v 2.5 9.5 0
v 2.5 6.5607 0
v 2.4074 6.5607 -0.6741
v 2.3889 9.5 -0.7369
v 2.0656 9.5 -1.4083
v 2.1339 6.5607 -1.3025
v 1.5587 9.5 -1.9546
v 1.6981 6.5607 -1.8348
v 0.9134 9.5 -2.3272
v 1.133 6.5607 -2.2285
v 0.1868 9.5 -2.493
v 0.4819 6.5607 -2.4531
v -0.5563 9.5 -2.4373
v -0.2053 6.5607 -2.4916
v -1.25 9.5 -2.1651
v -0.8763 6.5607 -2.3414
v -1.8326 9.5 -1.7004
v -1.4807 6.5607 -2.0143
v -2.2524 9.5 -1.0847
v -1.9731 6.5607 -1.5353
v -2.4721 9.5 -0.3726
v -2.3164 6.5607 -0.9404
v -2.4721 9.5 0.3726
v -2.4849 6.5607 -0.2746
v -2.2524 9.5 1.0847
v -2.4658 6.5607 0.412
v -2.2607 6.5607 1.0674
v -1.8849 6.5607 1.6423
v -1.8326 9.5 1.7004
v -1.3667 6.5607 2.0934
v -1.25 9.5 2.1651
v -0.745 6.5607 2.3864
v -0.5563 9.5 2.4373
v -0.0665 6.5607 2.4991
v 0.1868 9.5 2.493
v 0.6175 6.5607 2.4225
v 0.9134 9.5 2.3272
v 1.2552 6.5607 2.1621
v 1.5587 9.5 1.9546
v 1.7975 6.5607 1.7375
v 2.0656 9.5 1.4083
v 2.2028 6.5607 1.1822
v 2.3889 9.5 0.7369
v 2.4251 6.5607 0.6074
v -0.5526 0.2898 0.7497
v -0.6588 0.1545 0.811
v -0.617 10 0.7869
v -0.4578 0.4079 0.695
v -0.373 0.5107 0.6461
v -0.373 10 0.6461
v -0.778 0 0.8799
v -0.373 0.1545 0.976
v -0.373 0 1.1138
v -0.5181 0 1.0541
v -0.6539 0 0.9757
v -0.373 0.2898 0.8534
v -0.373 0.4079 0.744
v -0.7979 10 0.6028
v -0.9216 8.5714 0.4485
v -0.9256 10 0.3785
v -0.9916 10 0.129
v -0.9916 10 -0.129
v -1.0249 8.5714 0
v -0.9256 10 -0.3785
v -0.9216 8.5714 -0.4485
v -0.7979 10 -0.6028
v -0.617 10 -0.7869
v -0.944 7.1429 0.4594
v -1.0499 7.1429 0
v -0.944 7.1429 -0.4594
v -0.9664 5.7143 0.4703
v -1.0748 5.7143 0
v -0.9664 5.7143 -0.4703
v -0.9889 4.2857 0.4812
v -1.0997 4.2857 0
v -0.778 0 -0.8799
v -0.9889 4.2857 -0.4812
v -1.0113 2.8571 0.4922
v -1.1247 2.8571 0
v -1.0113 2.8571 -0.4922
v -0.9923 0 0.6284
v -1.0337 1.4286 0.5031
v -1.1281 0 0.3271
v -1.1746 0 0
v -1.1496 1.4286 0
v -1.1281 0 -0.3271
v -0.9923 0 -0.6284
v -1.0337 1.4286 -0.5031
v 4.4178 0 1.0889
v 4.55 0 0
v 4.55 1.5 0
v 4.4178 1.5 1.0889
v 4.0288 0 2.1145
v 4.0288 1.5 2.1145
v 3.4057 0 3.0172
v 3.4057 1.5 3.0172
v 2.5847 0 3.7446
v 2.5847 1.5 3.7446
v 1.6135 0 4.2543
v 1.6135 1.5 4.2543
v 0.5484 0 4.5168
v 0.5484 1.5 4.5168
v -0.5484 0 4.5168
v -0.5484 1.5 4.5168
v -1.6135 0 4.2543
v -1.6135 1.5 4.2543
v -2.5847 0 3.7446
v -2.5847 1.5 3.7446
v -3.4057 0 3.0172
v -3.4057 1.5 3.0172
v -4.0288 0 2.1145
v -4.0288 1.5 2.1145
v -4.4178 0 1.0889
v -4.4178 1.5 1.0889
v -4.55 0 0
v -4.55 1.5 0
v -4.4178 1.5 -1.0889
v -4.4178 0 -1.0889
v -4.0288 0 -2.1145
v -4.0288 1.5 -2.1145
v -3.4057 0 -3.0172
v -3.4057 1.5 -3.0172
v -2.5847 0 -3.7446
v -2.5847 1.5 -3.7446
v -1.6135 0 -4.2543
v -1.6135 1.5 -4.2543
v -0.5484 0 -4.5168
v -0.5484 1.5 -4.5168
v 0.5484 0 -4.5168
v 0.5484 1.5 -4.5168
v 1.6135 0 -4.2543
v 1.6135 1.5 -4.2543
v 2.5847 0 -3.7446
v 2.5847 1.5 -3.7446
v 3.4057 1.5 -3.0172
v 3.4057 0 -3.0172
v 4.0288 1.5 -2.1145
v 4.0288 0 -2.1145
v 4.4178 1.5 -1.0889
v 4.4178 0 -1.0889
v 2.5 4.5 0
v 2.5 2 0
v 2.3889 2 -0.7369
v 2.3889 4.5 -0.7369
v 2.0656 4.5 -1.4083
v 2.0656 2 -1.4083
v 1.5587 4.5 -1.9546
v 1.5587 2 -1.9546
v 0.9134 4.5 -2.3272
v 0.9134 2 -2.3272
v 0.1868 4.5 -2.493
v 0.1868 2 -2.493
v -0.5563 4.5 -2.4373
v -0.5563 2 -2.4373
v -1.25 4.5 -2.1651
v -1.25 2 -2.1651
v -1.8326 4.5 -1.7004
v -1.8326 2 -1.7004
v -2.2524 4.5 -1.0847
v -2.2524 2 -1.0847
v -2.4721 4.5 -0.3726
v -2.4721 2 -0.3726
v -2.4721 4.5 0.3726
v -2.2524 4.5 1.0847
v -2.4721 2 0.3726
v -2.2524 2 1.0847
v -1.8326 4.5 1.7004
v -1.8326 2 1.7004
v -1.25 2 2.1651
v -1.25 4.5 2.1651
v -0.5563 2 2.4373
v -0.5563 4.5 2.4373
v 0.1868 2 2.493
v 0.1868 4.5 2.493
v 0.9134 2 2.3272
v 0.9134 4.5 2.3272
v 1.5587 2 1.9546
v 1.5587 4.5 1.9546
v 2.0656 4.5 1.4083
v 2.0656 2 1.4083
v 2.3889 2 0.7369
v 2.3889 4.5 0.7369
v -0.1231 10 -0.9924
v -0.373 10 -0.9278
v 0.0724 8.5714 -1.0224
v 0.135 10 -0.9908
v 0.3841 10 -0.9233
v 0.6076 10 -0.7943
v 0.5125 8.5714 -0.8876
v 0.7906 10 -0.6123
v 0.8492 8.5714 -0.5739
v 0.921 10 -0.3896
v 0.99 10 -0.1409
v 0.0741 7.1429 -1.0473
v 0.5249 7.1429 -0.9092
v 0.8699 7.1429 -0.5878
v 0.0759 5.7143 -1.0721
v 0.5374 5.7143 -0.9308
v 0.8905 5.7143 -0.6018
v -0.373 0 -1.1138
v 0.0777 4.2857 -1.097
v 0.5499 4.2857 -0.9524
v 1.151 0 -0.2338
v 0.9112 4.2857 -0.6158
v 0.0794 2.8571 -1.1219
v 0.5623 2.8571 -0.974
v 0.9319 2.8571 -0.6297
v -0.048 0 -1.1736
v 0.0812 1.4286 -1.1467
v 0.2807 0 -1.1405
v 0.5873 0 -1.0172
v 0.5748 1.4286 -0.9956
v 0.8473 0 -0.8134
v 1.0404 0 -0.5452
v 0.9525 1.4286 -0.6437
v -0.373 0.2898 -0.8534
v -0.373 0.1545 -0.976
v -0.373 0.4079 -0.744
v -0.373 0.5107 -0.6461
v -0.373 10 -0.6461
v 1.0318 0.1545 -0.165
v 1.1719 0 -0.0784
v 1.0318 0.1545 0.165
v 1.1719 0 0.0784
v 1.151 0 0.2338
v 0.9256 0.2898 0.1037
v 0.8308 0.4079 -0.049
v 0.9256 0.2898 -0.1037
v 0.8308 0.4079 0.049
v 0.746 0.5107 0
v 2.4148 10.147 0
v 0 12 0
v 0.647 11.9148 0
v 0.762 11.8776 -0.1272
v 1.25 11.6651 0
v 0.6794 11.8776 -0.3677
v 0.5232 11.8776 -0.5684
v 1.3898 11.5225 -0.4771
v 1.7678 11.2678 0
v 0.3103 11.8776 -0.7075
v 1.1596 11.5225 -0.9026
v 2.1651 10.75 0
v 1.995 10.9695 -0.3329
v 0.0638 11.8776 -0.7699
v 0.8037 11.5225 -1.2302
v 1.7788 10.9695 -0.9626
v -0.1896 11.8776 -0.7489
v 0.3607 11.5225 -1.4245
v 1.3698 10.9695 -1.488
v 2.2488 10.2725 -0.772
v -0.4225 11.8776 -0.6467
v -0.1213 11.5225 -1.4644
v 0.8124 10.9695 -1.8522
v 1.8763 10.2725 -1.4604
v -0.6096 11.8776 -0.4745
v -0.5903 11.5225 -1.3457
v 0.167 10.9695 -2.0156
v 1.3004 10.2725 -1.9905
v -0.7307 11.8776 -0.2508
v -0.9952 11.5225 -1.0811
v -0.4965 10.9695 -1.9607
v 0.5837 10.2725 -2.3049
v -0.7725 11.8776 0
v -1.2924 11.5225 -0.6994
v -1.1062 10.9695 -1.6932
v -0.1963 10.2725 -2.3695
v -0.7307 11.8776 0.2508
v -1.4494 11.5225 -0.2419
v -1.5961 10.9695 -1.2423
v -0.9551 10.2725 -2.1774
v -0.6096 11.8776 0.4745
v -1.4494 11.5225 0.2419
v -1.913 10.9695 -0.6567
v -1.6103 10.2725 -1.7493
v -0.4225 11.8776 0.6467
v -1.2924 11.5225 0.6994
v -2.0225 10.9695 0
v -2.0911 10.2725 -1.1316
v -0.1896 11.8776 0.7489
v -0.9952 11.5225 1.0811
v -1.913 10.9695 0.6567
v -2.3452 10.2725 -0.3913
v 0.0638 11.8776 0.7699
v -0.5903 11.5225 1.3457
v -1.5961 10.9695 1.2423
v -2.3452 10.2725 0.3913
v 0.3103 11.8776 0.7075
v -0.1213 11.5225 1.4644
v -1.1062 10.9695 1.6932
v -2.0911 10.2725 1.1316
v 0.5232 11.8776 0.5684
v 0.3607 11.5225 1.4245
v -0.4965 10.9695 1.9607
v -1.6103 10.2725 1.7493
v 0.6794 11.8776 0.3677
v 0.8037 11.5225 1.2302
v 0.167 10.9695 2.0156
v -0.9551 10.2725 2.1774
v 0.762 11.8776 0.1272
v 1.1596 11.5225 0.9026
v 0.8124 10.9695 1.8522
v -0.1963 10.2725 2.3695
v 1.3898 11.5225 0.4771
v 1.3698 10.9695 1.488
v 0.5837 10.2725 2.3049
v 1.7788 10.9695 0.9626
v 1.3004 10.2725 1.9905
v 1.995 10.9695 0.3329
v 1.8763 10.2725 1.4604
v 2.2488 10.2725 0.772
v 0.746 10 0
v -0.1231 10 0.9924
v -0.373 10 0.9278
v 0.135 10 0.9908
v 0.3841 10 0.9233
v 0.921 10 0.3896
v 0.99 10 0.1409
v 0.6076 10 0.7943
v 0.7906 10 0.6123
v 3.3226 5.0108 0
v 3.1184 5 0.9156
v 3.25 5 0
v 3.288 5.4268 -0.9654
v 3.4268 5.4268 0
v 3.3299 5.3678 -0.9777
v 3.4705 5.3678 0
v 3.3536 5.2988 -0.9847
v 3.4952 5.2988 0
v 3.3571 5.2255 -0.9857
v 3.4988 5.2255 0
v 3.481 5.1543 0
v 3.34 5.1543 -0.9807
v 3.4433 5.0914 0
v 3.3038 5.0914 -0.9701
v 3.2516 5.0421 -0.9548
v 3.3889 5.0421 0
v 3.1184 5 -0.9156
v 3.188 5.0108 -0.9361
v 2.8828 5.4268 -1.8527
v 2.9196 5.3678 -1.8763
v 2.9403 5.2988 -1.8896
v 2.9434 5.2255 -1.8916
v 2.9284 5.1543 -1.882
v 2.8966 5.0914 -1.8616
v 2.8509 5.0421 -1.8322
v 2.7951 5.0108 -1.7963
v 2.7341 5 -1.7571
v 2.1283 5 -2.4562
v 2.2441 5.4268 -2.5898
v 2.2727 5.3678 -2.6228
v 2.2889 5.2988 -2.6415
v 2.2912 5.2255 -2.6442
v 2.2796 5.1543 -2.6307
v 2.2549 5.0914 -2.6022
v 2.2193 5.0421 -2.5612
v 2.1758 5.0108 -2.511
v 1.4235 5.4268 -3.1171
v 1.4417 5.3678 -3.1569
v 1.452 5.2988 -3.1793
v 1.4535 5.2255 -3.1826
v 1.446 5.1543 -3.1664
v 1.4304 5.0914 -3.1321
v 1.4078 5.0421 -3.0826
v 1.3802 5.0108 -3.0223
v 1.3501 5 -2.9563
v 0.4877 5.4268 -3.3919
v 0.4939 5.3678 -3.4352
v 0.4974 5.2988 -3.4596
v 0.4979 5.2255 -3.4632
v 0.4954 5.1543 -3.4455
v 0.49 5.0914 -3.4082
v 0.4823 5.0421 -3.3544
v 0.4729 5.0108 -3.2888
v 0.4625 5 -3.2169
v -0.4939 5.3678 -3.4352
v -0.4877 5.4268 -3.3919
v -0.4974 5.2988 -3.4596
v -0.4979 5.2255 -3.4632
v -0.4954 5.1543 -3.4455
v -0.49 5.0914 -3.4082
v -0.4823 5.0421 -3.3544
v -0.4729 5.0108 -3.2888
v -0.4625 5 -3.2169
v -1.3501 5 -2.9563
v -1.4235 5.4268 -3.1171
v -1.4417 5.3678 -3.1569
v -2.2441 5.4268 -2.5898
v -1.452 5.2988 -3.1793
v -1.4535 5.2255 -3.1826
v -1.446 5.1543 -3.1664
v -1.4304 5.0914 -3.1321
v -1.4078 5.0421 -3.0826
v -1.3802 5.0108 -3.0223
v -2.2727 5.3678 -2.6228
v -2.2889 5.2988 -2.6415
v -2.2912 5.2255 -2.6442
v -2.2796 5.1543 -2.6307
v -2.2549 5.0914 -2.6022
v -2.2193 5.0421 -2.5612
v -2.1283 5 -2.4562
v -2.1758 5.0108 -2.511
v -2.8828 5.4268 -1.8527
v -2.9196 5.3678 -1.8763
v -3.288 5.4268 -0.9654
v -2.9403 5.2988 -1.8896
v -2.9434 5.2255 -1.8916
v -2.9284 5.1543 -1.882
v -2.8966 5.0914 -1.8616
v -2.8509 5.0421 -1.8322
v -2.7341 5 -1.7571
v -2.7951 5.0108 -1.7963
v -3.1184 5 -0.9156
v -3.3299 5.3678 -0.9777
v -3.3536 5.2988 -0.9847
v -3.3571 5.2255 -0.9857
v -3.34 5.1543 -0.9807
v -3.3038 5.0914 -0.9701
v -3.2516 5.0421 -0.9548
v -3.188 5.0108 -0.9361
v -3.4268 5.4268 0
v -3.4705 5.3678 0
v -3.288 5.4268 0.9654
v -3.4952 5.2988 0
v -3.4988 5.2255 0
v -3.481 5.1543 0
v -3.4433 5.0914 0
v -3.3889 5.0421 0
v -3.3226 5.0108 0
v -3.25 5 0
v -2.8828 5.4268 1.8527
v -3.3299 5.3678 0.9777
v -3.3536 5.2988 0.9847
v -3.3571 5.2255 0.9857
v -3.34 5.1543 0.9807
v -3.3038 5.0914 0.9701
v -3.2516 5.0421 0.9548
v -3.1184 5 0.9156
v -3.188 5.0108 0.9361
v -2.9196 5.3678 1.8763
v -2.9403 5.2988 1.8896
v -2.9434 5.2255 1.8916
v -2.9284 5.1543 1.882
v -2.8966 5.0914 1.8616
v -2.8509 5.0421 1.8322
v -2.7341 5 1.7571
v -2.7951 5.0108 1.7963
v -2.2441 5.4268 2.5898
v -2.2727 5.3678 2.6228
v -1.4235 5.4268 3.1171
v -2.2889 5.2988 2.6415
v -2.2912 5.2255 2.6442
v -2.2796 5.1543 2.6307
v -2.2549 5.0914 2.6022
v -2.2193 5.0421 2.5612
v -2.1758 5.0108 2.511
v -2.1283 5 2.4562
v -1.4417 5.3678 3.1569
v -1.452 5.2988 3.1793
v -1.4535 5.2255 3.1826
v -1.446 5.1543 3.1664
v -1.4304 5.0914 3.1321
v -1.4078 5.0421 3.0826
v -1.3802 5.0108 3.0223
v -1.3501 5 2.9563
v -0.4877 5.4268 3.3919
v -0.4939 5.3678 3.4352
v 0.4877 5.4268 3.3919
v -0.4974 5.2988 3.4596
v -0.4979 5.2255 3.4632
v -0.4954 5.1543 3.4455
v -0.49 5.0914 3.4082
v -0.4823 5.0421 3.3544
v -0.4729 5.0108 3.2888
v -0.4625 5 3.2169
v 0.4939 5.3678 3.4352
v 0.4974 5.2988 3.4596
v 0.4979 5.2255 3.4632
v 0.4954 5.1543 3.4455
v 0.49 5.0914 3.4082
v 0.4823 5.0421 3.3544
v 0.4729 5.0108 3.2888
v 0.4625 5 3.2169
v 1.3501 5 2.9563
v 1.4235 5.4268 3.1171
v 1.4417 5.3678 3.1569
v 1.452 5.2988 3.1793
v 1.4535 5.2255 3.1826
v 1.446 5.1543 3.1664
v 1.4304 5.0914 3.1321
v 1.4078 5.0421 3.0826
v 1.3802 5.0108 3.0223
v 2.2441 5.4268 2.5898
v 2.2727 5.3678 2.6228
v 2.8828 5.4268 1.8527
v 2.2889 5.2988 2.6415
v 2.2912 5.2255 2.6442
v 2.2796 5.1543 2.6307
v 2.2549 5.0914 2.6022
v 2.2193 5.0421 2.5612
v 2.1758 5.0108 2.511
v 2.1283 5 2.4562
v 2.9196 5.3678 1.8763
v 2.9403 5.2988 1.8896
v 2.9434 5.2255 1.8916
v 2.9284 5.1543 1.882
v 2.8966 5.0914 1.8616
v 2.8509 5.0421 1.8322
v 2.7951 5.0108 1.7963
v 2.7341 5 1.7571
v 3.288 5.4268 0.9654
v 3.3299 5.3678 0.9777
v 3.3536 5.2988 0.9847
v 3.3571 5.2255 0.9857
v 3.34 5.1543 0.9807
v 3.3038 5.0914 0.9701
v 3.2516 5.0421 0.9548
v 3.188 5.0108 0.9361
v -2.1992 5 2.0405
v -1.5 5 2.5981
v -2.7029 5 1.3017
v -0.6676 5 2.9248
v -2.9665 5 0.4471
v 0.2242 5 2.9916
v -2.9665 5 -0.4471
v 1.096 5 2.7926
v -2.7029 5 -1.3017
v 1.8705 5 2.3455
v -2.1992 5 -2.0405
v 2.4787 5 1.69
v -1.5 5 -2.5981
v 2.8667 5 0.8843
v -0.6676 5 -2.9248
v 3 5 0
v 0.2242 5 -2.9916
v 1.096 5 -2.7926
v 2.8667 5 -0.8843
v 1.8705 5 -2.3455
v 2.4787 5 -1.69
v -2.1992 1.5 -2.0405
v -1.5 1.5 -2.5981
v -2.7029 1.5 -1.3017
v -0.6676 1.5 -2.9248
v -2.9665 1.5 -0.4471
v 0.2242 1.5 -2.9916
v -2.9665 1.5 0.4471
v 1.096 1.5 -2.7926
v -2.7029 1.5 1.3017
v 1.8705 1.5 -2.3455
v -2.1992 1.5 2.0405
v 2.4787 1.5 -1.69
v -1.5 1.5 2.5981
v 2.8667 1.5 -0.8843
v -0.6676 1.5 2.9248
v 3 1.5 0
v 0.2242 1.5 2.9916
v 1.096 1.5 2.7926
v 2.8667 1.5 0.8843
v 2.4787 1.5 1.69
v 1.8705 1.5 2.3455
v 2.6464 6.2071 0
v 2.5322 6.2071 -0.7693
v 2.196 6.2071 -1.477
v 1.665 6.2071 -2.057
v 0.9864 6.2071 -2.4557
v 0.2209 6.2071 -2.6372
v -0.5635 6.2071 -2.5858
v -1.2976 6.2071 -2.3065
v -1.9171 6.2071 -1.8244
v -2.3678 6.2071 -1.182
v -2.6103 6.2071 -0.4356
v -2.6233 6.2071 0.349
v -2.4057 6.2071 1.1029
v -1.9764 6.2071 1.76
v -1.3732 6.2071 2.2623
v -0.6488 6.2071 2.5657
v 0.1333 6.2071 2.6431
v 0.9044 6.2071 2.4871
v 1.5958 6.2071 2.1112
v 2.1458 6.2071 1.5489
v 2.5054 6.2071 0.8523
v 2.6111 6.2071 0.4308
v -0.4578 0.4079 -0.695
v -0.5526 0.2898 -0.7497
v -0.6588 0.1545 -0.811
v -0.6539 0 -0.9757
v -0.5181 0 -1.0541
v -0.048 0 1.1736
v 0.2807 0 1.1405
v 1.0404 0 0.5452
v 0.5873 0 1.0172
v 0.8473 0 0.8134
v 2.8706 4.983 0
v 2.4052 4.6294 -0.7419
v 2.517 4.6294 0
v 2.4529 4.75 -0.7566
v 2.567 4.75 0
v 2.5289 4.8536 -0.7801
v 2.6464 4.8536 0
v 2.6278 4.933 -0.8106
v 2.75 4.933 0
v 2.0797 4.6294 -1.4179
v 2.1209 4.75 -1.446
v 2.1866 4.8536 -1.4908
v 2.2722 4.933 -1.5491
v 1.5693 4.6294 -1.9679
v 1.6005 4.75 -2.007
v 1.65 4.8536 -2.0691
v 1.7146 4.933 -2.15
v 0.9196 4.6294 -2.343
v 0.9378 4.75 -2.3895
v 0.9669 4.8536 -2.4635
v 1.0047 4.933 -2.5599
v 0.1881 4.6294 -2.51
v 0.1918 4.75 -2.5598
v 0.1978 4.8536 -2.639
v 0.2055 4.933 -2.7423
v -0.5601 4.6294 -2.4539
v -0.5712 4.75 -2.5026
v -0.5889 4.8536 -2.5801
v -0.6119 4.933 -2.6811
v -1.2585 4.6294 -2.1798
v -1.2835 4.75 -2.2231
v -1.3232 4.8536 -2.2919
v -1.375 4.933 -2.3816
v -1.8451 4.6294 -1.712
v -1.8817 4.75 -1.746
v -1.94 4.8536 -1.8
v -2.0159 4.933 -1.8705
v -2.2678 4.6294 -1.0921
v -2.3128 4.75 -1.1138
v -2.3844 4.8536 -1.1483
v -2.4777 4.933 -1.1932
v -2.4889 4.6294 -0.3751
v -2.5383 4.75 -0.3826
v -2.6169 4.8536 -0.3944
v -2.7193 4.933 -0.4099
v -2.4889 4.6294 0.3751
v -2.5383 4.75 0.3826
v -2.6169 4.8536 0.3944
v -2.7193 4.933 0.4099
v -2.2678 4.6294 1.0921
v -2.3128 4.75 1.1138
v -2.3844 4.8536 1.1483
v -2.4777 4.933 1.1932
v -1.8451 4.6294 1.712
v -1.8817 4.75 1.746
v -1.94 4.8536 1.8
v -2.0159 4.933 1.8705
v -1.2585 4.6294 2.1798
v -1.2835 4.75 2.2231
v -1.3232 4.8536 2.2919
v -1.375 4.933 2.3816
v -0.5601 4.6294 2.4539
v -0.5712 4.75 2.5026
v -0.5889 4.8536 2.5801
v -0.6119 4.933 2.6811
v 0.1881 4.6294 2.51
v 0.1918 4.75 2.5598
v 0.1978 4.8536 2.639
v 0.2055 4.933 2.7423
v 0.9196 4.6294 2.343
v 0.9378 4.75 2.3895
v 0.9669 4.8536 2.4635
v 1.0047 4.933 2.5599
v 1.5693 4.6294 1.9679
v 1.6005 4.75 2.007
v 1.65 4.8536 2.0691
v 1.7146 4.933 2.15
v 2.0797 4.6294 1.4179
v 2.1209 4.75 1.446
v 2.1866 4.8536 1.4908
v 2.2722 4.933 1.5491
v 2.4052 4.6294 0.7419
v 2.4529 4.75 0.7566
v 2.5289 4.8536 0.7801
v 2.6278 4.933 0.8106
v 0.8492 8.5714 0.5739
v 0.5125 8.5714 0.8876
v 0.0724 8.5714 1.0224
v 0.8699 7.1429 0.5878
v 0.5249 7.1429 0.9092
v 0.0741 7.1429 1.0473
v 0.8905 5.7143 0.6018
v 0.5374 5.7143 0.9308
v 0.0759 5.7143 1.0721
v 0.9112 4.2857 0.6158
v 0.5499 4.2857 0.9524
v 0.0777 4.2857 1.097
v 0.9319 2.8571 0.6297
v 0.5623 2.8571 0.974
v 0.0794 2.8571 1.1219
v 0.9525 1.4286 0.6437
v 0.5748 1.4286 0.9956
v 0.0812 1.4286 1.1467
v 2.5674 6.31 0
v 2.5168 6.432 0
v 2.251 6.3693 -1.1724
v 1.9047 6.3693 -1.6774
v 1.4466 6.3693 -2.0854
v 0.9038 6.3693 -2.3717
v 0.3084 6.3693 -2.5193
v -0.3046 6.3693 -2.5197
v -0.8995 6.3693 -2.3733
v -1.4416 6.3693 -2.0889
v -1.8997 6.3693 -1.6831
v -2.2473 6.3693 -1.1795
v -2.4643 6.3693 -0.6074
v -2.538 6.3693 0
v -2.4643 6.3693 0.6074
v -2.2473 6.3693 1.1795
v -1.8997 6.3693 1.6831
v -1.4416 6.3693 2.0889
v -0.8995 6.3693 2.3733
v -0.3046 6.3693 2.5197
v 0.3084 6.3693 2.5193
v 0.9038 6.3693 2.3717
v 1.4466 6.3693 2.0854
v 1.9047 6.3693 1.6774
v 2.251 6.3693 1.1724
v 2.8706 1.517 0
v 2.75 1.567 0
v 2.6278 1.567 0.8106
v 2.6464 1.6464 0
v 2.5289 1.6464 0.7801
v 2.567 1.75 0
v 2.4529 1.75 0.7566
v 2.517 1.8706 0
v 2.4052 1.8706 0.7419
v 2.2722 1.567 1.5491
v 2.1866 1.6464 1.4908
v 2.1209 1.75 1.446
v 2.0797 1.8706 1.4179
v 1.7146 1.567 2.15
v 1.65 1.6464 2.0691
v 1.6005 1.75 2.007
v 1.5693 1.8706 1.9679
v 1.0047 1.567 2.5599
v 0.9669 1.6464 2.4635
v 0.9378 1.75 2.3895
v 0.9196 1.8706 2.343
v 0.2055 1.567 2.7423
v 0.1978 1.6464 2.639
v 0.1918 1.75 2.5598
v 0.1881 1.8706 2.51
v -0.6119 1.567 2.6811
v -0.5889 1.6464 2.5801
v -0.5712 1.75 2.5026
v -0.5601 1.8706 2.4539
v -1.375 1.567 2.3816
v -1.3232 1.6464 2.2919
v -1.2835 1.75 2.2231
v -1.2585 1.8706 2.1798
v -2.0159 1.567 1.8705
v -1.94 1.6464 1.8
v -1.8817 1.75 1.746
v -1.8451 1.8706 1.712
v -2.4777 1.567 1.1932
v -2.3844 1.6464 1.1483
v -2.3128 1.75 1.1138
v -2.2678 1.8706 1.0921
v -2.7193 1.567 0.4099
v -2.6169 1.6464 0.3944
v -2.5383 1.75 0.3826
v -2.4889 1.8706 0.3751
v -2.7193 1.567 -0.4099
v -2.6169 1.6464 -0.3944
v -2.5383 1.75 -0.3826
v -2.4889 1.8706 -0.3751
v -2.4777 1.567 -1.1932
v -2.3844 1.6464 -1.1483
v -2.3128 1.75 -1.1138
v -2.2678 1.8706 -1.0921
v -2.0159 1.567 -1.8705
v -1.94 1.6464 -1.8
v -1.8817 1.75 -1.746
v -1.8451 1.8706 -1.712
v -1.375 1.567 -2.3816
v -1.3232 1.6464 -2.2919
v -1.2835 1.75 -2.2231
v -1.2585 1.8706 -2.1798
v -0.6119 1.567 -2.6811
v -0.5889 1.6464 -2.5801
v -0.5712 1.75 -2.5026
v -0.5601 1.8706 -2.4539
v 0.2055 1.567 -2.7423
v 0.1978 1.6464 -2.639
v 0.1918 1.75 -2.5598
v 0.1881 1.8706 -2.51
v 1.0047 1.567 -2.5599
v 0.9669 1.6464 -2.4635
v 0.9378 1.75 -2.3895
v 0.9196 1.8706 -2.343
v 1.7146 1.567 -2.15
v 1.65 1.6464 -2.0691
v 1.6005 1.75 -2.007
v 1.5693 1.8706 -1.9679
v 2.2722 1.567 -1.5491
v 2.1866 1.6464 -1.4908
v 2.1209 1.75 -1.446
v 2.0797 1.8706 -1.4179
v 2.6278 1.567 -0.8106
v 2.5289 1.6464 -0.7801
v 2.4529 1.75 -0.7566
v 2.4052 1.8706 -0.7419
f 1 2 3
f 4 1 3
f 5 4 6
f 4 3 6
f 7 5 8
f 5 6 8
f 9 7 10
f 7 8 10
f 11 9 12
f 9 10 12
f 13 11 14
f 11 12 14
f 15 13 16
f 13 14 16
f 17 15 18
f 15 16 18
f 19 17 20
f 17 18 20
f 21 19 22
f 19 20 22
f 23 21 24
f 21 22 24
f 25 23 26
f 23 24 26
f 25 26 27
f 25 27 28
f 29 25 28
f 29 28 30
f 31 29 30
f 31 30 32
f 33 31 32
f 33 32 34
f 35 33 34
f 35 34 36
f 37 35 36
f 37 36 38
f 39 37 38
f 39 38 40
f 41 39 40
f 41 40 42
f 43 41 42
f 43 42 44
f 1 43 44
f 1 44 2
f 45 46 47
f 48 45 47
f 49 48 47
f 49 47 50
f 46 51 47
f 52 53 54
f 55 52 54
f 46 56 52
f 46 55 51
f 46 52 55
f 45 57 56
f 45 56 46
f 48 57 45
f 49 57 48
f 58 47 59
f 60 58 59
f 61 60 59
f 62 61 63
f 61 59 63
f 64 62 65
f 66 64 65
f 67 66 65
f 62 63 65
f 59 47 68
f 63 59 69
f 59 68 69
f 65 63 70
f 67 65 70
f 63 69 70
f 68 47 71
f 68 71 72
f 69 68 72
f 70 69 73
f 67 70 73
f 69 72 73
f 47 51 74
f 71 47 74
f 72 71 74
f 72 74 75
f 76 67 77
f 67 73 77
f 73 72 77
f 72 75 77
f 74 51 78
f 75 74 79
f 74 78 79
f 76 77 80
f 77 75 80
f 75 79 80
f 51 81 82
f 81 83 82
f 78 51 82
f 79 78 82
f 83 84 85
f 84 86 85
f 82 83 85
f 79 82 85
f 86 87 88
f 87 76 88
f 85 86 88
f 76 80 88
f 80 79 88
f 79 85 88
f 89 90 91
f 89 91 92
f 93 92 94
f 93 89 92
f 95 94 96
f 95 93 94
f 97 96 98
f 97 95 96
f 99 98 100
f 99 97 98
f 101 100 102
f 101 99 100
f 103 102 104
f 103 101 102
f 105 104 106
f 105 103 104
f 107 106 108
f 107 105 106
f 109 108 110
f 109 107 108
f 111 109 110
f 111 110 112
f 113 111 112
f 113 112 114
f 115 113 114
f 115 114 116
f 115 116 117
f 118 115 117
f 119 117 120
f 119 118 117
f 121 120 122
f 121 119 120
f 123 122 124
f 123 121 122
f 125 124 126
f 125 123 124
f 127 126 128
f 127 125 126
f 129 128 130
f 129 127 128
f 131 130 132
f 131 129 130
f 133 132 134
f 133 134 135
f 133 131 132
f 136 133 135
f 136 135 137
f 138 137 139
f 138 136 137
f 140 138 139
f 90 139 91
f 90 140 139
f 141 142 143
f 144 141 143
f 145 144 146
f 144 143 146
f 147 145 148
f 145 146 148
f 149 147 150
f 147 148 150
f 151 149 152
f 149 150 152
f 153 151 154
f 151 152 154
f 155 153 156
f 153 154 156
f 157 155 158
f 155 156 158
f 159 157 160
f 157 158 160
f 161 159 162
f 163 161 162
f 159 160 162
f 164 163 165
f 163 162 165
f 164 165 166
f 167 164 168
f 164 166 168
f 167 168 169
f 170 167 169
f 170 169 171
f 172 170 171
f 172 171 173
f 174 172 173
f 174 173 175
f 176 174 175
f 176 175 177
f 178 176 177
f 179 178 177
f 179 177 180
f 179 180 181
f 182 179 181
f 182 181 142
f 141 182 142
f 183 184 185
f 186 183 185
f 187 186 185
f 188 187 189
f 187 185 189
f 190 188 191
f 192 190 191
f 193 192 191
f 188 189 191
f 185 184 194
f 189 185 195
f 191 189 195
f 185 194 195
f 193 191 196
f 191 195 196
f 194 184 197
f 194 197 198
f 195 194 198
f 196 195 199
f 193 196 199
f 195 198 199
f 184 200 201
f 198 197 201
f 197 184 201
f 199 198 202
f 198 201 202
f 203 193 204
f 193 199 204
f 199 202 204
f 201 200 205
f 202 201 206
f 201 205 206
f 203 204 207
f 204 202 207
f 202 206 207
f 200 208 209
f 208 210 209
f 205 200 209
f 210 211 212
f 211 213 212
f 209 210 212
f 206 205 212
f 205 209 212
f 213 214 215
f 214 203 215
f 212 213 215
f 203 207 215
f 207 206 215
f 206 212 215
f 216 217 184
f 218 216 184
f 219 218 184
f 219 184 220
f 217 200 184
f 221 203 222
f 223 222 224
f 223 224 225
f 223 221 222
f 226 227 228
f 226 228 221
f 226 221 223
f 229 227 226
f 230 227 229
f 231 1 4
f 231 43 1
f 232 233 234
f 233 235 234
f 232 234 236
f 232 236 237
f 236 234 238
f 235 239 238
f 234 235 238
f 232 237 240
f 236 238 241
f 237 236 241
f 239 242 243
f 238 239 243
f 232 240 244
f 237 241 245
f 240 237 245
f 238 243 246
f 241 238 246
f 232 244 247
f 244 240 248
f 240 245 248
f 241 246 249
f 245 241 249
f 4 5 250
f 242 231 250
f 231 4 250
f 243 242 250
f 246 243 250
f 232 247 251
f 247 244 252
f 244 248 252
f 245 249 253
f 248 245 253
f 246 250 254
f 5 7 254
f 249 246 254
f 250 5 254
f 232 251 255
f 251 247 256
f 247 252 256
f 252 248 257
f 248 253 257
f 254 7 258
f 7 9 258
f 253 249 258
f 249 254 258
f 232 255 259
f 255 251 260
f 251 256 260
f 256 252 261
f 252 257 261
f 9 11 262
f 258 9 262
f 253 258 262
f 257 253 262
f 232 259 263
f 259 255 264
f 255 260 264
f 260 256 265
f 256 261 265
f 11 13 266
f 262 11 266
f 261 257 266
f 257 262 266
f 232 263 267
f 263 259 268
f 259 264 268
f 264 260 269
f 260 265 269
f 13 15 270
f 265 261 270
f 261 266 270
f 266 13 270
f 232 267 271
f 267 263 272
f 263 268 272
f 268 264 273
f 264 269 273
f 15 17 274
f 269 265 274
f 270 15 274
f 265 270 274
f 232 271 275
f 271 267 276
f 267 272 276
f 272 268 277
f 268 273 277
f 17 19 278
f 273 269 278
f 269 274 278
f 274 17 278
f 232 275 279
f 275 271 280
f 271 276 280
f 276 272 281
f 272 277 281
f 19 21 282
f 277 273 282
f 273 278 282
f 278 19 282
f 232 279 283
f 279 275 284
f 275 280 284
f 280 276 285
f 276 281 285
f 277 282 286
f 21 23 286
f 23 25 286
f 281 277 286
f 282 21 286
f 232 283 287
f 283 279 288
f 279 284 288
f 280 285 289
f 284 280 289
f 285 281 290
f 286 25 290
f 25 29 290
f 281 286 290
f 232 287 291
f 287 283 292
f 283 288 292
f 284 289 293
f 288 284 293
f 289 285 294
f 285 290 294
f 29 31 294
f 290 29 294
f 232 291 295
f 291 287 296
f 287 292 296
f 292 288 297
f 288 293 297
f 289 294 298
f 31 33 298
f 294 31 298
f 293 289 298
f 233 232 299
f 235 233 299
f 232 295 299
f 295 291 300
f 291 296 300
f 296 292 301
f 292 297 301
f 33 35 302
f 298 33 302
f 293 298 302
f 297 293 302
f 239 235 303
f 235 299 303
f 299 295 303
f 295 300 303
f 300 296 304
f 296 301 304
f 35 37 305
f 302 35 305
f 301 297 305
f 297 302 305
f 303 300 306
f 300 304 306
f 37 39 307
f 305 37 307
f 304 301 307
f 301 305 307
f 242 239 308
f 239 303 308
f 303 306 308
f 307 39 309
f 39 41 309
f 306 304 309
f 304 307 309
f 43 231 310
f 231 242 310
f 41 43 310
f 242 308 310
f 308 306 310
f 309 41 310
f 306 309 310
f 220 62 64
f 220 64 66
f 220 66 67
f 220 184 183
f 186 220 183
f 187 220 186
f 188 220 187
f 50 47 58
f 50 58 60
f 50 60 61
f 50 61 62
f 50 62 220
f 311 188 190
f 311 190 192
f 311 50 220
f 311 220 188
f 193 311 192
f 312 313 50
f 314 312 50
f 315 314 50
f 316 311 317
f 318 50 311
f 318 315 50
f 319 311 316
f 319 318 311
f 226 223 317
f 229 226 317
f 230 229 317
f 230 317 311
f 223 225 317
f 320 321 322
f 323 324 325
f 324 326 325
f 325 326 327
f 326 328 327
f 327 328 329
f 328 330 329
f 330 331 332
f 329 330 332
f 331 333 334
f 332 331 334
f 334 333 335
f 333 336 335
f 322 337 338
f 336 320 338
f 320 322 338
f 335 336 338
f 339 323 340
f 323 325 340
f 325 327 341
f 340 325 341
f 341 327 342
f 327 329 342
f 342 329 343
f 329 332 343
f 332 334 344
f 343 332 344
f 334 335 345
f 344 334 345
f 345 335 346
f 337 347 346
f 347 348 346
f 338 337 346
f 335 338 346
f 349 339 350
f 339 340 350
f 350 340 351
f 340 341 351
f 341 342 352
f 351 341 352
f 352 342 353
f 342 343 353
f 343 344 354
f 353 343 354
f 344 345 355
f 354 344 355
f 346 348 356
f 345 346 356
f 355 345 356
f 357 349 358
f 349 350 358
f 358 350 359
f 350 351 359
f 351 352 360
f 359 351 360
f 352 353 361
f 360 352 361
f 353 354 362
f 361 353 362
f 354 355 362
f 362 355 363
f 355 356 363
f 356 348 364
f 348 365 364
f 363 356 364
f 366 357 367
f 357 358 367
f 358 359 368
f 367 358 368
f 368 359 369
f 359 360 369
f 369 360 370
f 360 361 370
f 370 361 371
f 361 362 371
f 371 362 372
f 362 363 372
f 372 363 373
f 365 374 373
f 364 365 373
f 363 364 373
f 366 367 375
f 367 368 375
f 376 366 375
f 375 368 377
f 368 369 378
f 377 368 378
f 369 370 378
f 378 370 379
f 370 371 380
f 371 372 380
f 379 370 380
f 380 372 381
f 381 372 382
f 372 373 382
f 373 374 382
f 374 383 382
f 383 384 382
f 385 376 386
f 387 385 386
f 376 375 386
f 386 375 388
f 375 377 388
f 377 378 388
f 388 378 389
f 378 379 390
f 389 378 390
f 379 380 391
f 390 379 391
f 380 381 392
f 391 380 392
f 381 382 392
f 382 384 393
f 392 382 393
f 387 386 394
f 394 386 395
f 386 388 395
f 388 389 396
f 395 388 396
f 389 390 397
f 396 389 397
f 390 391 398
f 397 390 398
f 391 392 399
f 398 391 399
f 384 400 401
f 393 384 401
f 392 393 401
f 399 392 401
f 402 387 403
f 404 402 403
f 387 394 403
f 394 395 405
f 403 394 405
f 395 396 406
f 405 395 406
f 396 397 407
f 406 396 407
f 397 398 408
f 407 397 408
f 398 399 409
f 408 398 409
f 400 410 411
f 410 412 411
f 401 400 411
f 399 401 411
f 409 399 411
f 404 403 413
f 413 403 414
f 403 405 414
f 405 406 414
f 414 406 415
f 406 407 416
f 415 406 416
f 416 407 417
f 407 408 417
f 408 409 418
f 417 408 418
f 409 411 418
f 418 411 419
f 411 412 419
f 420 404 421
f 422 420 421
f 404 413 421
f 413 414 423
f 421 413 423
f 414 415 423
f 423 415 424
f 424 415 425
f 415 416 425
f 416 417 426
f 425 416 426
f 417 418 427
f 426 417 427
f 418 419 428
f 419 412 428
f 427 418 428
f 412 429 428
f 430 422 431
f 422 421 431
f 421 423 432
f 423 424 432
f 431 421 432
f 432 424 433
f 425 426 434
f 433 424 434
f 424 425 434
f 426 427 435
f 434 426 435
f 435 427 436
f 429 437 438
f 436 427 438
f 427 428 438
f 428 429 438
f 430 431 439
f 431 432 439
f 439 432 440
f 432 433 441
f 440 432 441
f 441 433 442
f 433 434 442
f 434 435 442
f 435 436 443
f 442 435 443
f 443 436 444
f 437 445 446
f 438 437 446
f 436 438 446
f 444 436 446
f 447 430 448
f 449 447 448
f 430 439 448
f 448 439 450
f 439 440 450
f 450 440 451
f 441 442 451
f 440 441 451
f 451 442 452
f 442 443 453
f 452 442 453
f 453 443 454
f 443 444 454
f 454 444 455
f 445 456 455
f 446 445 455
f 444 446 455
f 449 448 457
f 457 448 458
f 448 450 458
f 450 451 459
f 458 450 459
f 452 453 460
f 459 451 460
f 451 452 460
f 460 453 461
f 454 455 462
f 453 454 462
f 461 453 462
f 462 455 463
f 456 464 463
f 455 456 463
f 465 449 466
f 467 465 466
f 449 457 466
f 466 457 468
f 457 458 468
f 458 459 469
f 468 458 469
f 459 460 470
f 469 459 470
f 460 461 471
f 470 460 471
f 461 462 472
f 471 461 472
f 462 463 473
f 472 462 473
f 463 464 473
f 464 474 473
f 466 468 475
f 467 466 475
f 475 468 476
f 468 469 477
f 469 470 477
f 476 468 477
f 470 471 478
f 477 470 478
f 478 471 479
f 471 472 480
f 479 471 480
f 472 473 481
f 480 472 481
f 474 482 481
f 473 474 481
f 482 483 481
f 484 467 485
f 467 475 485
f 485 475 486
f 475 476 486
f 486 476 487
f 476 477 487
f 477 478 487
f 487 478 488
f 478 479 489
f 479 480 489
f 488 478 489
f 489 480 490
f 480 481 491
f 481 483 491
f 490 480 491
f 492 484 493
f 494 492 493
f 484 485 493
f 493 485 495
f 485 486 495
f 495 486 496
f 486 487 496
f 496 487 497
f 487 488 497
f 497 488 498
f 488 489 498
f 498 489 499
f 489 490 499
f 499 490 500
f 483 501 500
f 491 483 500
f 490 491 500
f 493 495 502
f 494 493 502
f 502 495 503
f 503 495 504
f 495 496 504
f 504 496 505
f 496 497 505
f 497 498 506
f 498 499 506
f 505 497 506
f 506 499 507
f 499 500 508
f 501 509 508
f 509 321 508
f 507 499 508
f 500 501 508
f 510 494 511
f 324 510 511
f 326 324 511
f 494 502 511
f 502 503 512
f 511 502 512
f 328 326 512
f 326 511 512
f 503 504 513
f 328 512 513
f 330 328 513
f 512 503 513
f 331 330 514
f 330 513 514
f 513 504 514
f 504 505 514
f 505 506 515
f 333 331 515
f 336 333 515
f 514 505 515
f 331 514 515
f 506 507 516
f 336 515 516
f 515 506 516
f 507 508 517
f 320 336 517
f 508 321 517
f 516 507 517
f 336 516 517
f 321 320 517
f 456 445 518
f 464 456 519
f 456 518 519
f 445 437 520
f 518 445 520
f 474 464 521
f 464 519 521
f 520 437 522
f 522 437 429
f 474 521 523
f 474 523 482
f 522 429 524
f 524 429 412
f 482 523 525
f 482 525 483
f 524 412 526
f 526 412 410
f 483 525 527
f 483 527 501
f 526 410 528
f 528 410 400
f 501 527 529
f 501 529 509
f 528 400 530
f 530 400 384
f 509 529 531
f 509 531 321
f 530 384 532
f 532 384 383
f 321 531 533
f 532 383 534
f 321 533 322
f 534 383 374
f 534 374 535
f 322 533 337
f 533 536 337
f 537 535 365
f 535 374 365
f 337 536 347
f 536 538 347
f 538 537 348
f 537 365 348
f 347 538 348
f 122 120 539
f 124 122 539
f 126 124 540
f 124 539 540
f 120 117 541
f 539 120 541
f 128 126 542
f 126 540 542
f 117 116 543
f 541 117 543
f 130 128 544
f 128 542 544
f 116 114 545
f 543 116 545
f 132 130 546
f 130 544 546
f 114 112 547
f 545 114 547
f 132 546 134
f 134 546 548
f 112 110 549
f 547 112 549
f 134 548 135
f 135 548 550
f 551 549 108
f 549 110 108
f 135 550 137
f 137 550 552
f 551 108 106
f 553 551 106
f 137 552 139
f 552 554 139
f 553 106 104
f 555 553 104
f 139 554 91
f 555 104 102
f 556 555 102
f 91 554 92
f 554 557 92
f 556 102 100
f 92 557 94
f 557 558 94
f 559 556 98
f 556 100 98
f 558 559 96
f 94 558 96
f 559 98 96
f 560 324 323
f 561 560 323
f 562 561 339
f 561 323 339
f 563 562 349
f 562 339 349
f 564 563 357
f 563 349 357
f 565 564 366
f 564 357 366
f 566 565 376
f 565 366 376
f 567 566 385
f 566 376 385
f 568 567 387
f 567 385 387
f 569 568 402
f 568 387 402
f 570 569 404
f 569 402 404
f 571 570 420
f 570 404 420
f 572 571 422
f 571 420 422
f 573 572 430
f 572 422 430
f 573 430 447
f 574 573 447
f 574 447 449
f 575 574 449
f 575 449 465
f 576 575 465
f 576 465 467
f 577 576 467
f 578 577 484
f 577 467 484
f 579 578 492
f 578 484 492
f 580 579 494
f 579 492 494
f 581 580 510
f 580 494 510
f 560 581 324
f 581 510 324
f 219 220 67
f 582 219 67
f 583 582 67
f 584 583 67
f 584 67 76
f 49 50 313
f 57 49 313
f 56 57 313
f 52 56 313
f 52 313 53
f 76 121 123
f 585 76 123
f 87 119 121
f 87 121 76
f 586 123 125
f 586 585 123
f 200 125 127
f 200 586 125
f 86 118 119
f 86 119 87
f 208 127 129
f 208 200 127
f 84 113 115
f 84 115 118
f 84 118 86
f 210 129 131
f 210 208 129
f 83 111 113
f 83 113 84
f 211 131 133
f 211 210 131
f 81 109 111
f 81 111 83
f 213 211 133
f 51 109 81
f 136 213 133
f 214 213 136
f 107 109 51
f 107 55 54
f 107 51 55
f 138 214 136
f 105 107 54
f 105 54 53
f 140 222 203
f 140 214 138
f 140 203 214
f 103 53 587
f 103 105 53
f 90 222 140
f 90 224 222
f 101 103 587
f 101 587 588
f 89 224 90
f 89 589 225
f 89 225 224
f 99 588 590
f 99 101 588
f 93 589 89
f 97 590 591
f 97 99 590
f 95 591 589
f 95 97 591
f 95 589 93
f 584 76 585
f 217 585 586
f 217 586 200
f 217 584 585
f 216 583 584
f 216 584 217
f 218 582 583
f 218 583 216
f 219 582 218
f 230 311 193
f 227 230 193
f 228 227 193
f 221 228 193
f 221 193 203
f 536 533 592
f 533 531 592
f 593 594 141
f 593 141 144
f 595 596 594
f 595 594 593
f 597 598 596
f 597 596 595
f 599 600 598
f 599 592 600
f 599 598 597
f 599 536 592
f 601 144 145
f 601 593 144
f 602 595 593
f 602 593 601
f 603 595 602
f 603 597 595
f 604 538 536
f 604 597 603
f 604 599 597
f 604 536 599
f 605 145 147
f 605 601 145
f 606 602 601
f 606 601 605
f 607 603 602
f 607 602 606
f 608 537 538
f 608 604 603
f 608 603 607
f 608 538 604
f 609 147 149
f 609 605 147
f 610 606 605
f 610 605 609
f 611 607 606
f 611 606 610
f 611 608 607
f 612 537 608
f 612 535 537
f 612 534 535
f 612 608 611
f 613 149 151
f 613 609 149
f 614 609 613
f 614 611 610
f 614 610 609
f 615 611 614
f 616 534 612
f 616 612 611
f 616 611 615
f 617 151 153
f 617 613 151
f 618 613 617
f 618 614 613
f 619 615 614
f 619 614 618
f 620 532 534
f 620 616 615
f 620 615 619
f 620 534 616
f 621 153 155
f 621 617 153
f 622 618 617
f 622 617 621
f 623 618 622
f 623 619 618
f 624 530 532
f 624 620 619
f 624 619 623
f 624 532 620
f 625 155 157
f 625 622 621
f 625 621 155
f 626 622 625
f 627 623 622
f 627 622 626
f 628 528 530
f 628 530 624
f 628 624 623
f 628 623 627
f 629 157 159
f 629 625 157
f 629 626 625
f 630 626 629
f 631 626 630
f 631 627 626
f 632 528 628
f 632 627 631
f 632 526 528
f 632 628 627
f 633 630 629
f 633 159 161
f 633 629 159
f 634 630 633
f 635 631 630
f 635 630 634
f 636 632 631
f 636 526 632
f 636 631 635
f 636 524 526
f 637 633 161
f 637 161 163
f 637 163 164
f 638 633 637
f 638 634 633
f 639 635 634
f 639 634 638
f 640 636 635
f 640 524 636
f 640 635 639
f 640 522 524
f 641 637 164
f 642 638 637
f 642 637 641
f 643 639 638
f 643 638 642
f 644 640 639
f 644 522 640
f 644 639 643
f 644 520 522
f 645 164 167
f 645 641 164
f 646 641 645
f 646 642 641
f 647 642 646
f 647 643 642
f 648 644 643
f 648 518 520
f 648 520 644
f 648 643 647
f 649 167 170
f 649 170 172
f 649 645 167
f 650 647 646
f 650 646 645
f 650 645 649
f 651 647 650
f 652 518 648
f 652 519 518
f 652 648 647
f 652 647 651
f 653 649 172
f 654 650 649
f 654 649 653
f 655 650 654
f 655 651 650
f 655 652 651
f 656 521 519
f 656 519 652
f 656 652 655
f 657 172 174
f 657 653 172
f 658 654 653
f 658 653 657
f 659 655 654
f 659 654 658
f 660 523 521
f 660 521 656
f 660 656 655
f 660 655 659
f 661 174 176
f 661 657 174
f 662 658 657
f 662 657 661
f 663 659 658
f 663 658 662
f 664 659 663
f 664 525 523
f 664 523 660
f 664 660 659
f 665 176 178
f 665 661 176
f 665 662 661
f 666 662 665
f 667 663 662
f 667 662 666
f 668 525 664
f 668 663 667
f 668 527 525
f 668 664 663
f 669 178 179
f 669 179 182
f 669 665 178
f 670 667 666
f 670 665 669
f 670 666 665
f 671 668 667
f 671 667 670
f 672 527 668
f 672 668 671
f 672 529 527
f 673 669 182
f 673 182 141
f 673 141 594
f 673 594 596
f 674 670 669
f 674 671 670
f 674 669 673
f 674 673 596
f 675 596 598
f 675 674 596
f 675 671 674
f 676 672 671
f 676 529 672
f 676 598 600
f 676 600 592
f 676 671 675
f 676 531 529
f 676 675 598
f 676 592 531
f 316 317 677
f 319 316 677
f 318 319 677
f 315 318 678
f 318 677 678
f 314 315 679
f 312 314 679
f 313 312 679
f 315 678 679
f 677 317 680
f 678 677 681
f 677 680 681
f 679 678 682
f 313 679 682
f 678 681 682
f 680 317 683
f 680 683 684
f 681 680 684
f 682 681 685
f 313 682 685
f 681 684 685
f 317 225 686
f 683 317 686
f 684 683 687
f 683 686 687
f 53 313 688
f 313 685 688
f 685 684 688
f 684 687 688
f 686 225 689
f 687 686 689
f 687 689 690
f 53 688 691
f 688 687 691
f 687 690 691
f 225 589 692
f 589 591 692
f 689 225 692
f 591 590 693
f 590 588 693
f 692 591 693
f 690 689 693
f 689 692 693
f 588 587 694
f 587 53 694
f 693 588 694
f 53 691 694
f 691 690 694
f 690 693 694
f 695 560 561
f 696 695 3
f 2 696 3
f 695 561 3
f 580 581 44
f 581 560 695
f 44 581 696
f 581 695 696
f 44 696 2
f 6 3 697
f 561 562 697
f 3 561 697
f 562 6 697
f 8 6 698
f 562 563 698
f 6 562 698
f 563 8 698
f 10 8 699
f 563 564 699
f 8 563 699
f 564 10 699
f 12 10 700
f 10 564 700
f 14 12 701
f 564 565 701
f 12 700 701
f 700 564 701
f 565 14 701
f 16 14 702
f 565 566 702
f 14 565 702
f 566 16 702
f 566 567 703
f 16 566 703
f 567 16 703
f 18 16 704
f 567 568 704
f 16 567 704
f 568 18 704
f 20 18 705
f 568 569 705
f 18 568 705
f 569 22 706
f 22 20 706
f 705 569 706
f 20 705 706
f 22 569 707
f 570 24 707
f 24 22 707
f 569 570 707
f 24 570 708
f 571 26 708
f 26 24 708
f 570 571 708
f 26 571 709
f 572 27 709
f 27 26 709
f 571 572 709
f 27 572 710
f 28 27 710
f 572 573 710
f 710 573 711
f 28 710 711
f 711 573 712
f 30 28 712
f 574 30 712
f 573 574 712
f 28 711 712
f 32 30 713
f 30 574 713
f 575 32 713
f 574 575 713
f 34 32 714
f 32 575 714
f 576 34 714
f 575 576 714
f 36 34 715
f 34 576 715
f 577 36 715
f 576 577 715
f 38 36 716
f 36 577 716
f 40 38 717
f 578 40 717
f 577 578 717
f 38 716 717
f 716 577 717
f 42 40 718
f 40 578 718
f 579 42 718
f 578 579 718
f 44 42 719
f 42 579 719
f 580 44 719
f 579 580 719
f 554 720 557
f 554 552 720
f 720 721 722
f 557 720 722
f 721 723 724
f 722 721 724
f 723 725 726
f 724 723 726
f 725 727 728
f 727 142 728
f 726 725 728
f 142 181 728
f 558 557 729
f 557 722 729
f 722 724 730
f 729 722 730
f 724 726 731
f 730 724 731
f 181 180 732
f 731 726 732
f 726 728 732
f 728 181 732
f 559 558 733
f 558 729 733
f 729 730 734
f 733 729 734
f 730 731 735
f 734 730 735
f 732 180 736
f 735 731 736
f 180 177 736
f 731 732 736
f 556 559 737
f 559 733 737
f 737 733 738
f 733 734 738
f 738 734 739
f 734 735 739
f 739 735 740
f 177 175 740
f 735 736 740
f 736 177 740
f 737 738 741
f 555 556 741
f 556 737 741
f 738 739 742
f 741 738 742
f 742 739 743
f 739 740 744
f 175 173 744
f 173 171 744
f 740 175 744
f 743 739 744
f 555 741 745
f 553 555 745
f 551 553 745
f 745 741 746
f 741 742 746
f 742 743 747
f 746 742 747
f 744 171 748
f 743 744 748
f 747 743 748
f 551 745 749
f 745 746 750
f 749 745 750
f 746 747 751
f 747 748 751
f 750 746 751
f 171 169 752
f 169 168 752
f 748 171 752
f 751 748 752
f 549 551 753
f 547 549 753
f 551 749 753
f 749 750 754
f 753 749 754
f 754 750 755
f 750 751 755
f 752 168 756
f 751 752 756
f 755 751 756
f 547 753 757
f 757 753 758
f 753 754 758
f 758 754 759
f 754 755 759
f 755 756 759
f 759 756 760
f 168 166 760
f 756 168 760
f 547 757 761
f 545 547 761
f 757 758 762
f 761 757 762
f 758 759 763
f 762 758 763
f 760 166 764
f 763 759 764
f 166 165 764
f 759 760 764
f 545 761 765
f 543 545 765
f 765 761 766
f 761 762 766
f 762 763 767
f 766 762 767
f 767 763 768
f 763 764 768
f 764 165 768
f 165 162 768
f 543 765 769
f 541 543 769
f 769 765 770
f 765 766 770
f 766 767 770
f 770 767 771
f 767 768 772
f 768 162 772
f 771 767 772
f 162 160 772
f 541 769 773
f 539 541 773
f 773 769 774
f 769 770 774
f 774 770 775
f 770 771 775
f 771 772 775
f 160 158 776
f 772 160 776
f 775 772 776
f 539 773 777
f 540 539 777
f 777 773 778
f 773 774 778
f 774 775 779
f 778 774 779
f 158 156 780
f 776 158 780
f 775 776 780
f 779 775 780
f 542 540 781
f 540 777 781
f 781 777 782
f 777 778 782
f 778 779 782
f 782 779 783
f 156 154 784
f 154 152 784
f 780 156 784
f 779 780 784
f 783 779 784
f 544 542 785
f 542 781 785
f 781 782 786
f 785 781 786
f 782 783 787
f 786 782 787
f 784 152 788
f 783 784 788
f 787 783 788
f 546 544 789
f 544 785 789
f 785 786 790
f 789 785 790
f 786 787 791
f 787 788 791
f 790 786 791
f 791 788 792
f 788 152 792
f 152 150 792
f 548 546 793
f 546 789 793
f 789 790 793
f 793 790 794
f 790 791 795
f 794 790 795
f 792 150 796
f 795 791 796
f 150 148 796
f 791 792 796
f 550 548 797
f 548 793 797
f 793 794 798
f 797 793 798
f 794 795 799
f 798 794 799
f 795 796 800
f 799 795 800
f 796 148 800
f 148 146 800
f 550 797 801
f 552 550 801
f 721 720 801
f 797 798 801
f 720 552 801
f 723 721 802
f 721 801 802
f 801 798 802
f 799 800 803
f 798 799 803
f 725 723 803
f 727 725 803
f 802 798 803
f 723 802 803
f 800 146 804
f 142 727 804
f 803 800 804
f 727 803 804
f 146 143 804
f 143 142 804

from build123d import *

# Parameters (mm, degrees)
SKETCH1_R           = 2.5
BOSS_EXTRUDE1_DEPTH = 12
SKETCH6_R           = 4.55
BOSS_EXTRUDE3_DEPTH = 1.5
SKETCH2_R           = 1
CUT_EXTRUDE1_DEPTH  = 10
DRAFT1_ANGLE        = 1
BOSS_EXTRUDE2_DEPTH = 10
FILLET1_R           = 0.5


with BuildPart() as part:
    # Sketch1 → Boss-Extrude1 (new body)
    with BuildSketch(Plane(origin=(0, 0, 0), x_dir=(1, 0, 0), z_dir=(0, 1, 0))):
        Circle(SKETCH1_R)
    extrude(amount=BOSS_EXTRUDE1_DEPTH)

    # Sketch6 → Boss-Extrude3 (add)
    with BuildSketch(Plane.XZ):
        Circle(SKETCH6_R)
    extrude(amount=-BOSS_EXTRUDE3_DEPTH)

    # Sketch8 → Revolve1 (revolve)
    with BuildSketch(Plane.XY):
        with BuildLine():
            Line((2.5, 6.353553391), (3.426776695, 5.426776695))
            ThreePointArc((3.426776695, 5.426776695), (3.480969883, 5.154329142), (3.25, 5))
            Line((3.25, 5), (2.5, 5))
            Line((2.5, 5), (2.5, 6.353553391))
        make_face()
    revolve(axis=Axis((0, 0, 0), (0, 1, 0)))

    # Sketch2 → Cut-Extrude1 (cut)
    with BuildSketch(Plane.XZ):
        Circle(SKETCH2_R)
    extrude(amount=-CUT_EXTRUDE1_DEPTH, mode=Mode.SUBTRACT)

    # Draft1
    draft1_faces = [part.faces().sort_by_distance(p)[0] for p in [
        (-1, 5, 0),
    ]]
    draft(draft1_faces, Plane(origin=(0, 10, 0), x_dir=(0, 0, -1), z_dir=(0, -1, 0)), DRAFT1_ANGLE)

    # Sketch7 → Cut-Revolve3 (revolve, cut)
    with BuildSketch(Plane.XY):
        with BuildLine():
            Line((2.5, 9.5), (3.080651327, 9.5))
            Line((3.080651327, 9.5), (3.080651327, 12.580651327))
            Line((3.080651327, 12.580651327), (0, 12.580651327))
            Line((0, 12.580651327), (0, 12))
            ThreePointArc((0, 12), (1.767766953, 11.267766953), (2.5, 9.5))
        make_face()
    revolve(axis=Axis((0, 9.5, 0), (0, 1, 0)), mode=Mode.SUBTRACT)

    # Sketch3 → Boss-Extrude2 (add)
    with BuildSketch(Plane.XZ.offset(-10)):
        with BuildLine():
            Line((1.151036246, 0.233847786), (0.746, 0))
            Line((0.746, 0), (1.151036246, -0.233847786))
            ThreePointArc((1.151036246, -0.233847786), (1.174550649, 0), (1.151036246, 0.233847786))
        make_face()
        with BuildLine():
            Line((-0.373, -1.113750523), (-0.373, -0.646054951))
            Line((-0.373, -0.646054951), (-0.778036246, -0.879902737))
            ThreePointArc((-0.778036246, -0.879902737), (-0.587275325, -1.0171907), (-0.373, -1.113750523))
        make_face()
        with BuildLine():
            Line((-0.778036246, 0.879902737), (-0.373, 0.646054951))
            Line((-0.373, 0.646054951), (-0.373, 1.113750523))
            ThreePointArc((-0.373, 1.113750523), (-0.587275325, 1.0171907), (-0.778036246, 0.879902737))
        make_face()
    extrude(amount=BOSS_EXTRUDE2_DEPTH)

    # Sketch4 → Cut-Revolve1 (revolve, cut)
    with BuildSketch(Plane.XY):
        Polygon((1.174550649, 0), (0.746, 0.510726776), (0, 0.510726776), (0, 0), align=None)
    revolve(axis=Axis((0, 0.510726776, 0), (0, -1, 0)), mode=Mode.SUBTRACT)

    # Fillet1
    fillet1_edges = [part.edges().sort_by_distance(p)[0] for p in [
        (-2.5, 5, 0),
        (-2.5, 6.353553391, 0),
        (-2.5, 1.5, 0),
    ]]
    fillet(fillet1_edges, radius=FILLET1_R)


solid = part.part
